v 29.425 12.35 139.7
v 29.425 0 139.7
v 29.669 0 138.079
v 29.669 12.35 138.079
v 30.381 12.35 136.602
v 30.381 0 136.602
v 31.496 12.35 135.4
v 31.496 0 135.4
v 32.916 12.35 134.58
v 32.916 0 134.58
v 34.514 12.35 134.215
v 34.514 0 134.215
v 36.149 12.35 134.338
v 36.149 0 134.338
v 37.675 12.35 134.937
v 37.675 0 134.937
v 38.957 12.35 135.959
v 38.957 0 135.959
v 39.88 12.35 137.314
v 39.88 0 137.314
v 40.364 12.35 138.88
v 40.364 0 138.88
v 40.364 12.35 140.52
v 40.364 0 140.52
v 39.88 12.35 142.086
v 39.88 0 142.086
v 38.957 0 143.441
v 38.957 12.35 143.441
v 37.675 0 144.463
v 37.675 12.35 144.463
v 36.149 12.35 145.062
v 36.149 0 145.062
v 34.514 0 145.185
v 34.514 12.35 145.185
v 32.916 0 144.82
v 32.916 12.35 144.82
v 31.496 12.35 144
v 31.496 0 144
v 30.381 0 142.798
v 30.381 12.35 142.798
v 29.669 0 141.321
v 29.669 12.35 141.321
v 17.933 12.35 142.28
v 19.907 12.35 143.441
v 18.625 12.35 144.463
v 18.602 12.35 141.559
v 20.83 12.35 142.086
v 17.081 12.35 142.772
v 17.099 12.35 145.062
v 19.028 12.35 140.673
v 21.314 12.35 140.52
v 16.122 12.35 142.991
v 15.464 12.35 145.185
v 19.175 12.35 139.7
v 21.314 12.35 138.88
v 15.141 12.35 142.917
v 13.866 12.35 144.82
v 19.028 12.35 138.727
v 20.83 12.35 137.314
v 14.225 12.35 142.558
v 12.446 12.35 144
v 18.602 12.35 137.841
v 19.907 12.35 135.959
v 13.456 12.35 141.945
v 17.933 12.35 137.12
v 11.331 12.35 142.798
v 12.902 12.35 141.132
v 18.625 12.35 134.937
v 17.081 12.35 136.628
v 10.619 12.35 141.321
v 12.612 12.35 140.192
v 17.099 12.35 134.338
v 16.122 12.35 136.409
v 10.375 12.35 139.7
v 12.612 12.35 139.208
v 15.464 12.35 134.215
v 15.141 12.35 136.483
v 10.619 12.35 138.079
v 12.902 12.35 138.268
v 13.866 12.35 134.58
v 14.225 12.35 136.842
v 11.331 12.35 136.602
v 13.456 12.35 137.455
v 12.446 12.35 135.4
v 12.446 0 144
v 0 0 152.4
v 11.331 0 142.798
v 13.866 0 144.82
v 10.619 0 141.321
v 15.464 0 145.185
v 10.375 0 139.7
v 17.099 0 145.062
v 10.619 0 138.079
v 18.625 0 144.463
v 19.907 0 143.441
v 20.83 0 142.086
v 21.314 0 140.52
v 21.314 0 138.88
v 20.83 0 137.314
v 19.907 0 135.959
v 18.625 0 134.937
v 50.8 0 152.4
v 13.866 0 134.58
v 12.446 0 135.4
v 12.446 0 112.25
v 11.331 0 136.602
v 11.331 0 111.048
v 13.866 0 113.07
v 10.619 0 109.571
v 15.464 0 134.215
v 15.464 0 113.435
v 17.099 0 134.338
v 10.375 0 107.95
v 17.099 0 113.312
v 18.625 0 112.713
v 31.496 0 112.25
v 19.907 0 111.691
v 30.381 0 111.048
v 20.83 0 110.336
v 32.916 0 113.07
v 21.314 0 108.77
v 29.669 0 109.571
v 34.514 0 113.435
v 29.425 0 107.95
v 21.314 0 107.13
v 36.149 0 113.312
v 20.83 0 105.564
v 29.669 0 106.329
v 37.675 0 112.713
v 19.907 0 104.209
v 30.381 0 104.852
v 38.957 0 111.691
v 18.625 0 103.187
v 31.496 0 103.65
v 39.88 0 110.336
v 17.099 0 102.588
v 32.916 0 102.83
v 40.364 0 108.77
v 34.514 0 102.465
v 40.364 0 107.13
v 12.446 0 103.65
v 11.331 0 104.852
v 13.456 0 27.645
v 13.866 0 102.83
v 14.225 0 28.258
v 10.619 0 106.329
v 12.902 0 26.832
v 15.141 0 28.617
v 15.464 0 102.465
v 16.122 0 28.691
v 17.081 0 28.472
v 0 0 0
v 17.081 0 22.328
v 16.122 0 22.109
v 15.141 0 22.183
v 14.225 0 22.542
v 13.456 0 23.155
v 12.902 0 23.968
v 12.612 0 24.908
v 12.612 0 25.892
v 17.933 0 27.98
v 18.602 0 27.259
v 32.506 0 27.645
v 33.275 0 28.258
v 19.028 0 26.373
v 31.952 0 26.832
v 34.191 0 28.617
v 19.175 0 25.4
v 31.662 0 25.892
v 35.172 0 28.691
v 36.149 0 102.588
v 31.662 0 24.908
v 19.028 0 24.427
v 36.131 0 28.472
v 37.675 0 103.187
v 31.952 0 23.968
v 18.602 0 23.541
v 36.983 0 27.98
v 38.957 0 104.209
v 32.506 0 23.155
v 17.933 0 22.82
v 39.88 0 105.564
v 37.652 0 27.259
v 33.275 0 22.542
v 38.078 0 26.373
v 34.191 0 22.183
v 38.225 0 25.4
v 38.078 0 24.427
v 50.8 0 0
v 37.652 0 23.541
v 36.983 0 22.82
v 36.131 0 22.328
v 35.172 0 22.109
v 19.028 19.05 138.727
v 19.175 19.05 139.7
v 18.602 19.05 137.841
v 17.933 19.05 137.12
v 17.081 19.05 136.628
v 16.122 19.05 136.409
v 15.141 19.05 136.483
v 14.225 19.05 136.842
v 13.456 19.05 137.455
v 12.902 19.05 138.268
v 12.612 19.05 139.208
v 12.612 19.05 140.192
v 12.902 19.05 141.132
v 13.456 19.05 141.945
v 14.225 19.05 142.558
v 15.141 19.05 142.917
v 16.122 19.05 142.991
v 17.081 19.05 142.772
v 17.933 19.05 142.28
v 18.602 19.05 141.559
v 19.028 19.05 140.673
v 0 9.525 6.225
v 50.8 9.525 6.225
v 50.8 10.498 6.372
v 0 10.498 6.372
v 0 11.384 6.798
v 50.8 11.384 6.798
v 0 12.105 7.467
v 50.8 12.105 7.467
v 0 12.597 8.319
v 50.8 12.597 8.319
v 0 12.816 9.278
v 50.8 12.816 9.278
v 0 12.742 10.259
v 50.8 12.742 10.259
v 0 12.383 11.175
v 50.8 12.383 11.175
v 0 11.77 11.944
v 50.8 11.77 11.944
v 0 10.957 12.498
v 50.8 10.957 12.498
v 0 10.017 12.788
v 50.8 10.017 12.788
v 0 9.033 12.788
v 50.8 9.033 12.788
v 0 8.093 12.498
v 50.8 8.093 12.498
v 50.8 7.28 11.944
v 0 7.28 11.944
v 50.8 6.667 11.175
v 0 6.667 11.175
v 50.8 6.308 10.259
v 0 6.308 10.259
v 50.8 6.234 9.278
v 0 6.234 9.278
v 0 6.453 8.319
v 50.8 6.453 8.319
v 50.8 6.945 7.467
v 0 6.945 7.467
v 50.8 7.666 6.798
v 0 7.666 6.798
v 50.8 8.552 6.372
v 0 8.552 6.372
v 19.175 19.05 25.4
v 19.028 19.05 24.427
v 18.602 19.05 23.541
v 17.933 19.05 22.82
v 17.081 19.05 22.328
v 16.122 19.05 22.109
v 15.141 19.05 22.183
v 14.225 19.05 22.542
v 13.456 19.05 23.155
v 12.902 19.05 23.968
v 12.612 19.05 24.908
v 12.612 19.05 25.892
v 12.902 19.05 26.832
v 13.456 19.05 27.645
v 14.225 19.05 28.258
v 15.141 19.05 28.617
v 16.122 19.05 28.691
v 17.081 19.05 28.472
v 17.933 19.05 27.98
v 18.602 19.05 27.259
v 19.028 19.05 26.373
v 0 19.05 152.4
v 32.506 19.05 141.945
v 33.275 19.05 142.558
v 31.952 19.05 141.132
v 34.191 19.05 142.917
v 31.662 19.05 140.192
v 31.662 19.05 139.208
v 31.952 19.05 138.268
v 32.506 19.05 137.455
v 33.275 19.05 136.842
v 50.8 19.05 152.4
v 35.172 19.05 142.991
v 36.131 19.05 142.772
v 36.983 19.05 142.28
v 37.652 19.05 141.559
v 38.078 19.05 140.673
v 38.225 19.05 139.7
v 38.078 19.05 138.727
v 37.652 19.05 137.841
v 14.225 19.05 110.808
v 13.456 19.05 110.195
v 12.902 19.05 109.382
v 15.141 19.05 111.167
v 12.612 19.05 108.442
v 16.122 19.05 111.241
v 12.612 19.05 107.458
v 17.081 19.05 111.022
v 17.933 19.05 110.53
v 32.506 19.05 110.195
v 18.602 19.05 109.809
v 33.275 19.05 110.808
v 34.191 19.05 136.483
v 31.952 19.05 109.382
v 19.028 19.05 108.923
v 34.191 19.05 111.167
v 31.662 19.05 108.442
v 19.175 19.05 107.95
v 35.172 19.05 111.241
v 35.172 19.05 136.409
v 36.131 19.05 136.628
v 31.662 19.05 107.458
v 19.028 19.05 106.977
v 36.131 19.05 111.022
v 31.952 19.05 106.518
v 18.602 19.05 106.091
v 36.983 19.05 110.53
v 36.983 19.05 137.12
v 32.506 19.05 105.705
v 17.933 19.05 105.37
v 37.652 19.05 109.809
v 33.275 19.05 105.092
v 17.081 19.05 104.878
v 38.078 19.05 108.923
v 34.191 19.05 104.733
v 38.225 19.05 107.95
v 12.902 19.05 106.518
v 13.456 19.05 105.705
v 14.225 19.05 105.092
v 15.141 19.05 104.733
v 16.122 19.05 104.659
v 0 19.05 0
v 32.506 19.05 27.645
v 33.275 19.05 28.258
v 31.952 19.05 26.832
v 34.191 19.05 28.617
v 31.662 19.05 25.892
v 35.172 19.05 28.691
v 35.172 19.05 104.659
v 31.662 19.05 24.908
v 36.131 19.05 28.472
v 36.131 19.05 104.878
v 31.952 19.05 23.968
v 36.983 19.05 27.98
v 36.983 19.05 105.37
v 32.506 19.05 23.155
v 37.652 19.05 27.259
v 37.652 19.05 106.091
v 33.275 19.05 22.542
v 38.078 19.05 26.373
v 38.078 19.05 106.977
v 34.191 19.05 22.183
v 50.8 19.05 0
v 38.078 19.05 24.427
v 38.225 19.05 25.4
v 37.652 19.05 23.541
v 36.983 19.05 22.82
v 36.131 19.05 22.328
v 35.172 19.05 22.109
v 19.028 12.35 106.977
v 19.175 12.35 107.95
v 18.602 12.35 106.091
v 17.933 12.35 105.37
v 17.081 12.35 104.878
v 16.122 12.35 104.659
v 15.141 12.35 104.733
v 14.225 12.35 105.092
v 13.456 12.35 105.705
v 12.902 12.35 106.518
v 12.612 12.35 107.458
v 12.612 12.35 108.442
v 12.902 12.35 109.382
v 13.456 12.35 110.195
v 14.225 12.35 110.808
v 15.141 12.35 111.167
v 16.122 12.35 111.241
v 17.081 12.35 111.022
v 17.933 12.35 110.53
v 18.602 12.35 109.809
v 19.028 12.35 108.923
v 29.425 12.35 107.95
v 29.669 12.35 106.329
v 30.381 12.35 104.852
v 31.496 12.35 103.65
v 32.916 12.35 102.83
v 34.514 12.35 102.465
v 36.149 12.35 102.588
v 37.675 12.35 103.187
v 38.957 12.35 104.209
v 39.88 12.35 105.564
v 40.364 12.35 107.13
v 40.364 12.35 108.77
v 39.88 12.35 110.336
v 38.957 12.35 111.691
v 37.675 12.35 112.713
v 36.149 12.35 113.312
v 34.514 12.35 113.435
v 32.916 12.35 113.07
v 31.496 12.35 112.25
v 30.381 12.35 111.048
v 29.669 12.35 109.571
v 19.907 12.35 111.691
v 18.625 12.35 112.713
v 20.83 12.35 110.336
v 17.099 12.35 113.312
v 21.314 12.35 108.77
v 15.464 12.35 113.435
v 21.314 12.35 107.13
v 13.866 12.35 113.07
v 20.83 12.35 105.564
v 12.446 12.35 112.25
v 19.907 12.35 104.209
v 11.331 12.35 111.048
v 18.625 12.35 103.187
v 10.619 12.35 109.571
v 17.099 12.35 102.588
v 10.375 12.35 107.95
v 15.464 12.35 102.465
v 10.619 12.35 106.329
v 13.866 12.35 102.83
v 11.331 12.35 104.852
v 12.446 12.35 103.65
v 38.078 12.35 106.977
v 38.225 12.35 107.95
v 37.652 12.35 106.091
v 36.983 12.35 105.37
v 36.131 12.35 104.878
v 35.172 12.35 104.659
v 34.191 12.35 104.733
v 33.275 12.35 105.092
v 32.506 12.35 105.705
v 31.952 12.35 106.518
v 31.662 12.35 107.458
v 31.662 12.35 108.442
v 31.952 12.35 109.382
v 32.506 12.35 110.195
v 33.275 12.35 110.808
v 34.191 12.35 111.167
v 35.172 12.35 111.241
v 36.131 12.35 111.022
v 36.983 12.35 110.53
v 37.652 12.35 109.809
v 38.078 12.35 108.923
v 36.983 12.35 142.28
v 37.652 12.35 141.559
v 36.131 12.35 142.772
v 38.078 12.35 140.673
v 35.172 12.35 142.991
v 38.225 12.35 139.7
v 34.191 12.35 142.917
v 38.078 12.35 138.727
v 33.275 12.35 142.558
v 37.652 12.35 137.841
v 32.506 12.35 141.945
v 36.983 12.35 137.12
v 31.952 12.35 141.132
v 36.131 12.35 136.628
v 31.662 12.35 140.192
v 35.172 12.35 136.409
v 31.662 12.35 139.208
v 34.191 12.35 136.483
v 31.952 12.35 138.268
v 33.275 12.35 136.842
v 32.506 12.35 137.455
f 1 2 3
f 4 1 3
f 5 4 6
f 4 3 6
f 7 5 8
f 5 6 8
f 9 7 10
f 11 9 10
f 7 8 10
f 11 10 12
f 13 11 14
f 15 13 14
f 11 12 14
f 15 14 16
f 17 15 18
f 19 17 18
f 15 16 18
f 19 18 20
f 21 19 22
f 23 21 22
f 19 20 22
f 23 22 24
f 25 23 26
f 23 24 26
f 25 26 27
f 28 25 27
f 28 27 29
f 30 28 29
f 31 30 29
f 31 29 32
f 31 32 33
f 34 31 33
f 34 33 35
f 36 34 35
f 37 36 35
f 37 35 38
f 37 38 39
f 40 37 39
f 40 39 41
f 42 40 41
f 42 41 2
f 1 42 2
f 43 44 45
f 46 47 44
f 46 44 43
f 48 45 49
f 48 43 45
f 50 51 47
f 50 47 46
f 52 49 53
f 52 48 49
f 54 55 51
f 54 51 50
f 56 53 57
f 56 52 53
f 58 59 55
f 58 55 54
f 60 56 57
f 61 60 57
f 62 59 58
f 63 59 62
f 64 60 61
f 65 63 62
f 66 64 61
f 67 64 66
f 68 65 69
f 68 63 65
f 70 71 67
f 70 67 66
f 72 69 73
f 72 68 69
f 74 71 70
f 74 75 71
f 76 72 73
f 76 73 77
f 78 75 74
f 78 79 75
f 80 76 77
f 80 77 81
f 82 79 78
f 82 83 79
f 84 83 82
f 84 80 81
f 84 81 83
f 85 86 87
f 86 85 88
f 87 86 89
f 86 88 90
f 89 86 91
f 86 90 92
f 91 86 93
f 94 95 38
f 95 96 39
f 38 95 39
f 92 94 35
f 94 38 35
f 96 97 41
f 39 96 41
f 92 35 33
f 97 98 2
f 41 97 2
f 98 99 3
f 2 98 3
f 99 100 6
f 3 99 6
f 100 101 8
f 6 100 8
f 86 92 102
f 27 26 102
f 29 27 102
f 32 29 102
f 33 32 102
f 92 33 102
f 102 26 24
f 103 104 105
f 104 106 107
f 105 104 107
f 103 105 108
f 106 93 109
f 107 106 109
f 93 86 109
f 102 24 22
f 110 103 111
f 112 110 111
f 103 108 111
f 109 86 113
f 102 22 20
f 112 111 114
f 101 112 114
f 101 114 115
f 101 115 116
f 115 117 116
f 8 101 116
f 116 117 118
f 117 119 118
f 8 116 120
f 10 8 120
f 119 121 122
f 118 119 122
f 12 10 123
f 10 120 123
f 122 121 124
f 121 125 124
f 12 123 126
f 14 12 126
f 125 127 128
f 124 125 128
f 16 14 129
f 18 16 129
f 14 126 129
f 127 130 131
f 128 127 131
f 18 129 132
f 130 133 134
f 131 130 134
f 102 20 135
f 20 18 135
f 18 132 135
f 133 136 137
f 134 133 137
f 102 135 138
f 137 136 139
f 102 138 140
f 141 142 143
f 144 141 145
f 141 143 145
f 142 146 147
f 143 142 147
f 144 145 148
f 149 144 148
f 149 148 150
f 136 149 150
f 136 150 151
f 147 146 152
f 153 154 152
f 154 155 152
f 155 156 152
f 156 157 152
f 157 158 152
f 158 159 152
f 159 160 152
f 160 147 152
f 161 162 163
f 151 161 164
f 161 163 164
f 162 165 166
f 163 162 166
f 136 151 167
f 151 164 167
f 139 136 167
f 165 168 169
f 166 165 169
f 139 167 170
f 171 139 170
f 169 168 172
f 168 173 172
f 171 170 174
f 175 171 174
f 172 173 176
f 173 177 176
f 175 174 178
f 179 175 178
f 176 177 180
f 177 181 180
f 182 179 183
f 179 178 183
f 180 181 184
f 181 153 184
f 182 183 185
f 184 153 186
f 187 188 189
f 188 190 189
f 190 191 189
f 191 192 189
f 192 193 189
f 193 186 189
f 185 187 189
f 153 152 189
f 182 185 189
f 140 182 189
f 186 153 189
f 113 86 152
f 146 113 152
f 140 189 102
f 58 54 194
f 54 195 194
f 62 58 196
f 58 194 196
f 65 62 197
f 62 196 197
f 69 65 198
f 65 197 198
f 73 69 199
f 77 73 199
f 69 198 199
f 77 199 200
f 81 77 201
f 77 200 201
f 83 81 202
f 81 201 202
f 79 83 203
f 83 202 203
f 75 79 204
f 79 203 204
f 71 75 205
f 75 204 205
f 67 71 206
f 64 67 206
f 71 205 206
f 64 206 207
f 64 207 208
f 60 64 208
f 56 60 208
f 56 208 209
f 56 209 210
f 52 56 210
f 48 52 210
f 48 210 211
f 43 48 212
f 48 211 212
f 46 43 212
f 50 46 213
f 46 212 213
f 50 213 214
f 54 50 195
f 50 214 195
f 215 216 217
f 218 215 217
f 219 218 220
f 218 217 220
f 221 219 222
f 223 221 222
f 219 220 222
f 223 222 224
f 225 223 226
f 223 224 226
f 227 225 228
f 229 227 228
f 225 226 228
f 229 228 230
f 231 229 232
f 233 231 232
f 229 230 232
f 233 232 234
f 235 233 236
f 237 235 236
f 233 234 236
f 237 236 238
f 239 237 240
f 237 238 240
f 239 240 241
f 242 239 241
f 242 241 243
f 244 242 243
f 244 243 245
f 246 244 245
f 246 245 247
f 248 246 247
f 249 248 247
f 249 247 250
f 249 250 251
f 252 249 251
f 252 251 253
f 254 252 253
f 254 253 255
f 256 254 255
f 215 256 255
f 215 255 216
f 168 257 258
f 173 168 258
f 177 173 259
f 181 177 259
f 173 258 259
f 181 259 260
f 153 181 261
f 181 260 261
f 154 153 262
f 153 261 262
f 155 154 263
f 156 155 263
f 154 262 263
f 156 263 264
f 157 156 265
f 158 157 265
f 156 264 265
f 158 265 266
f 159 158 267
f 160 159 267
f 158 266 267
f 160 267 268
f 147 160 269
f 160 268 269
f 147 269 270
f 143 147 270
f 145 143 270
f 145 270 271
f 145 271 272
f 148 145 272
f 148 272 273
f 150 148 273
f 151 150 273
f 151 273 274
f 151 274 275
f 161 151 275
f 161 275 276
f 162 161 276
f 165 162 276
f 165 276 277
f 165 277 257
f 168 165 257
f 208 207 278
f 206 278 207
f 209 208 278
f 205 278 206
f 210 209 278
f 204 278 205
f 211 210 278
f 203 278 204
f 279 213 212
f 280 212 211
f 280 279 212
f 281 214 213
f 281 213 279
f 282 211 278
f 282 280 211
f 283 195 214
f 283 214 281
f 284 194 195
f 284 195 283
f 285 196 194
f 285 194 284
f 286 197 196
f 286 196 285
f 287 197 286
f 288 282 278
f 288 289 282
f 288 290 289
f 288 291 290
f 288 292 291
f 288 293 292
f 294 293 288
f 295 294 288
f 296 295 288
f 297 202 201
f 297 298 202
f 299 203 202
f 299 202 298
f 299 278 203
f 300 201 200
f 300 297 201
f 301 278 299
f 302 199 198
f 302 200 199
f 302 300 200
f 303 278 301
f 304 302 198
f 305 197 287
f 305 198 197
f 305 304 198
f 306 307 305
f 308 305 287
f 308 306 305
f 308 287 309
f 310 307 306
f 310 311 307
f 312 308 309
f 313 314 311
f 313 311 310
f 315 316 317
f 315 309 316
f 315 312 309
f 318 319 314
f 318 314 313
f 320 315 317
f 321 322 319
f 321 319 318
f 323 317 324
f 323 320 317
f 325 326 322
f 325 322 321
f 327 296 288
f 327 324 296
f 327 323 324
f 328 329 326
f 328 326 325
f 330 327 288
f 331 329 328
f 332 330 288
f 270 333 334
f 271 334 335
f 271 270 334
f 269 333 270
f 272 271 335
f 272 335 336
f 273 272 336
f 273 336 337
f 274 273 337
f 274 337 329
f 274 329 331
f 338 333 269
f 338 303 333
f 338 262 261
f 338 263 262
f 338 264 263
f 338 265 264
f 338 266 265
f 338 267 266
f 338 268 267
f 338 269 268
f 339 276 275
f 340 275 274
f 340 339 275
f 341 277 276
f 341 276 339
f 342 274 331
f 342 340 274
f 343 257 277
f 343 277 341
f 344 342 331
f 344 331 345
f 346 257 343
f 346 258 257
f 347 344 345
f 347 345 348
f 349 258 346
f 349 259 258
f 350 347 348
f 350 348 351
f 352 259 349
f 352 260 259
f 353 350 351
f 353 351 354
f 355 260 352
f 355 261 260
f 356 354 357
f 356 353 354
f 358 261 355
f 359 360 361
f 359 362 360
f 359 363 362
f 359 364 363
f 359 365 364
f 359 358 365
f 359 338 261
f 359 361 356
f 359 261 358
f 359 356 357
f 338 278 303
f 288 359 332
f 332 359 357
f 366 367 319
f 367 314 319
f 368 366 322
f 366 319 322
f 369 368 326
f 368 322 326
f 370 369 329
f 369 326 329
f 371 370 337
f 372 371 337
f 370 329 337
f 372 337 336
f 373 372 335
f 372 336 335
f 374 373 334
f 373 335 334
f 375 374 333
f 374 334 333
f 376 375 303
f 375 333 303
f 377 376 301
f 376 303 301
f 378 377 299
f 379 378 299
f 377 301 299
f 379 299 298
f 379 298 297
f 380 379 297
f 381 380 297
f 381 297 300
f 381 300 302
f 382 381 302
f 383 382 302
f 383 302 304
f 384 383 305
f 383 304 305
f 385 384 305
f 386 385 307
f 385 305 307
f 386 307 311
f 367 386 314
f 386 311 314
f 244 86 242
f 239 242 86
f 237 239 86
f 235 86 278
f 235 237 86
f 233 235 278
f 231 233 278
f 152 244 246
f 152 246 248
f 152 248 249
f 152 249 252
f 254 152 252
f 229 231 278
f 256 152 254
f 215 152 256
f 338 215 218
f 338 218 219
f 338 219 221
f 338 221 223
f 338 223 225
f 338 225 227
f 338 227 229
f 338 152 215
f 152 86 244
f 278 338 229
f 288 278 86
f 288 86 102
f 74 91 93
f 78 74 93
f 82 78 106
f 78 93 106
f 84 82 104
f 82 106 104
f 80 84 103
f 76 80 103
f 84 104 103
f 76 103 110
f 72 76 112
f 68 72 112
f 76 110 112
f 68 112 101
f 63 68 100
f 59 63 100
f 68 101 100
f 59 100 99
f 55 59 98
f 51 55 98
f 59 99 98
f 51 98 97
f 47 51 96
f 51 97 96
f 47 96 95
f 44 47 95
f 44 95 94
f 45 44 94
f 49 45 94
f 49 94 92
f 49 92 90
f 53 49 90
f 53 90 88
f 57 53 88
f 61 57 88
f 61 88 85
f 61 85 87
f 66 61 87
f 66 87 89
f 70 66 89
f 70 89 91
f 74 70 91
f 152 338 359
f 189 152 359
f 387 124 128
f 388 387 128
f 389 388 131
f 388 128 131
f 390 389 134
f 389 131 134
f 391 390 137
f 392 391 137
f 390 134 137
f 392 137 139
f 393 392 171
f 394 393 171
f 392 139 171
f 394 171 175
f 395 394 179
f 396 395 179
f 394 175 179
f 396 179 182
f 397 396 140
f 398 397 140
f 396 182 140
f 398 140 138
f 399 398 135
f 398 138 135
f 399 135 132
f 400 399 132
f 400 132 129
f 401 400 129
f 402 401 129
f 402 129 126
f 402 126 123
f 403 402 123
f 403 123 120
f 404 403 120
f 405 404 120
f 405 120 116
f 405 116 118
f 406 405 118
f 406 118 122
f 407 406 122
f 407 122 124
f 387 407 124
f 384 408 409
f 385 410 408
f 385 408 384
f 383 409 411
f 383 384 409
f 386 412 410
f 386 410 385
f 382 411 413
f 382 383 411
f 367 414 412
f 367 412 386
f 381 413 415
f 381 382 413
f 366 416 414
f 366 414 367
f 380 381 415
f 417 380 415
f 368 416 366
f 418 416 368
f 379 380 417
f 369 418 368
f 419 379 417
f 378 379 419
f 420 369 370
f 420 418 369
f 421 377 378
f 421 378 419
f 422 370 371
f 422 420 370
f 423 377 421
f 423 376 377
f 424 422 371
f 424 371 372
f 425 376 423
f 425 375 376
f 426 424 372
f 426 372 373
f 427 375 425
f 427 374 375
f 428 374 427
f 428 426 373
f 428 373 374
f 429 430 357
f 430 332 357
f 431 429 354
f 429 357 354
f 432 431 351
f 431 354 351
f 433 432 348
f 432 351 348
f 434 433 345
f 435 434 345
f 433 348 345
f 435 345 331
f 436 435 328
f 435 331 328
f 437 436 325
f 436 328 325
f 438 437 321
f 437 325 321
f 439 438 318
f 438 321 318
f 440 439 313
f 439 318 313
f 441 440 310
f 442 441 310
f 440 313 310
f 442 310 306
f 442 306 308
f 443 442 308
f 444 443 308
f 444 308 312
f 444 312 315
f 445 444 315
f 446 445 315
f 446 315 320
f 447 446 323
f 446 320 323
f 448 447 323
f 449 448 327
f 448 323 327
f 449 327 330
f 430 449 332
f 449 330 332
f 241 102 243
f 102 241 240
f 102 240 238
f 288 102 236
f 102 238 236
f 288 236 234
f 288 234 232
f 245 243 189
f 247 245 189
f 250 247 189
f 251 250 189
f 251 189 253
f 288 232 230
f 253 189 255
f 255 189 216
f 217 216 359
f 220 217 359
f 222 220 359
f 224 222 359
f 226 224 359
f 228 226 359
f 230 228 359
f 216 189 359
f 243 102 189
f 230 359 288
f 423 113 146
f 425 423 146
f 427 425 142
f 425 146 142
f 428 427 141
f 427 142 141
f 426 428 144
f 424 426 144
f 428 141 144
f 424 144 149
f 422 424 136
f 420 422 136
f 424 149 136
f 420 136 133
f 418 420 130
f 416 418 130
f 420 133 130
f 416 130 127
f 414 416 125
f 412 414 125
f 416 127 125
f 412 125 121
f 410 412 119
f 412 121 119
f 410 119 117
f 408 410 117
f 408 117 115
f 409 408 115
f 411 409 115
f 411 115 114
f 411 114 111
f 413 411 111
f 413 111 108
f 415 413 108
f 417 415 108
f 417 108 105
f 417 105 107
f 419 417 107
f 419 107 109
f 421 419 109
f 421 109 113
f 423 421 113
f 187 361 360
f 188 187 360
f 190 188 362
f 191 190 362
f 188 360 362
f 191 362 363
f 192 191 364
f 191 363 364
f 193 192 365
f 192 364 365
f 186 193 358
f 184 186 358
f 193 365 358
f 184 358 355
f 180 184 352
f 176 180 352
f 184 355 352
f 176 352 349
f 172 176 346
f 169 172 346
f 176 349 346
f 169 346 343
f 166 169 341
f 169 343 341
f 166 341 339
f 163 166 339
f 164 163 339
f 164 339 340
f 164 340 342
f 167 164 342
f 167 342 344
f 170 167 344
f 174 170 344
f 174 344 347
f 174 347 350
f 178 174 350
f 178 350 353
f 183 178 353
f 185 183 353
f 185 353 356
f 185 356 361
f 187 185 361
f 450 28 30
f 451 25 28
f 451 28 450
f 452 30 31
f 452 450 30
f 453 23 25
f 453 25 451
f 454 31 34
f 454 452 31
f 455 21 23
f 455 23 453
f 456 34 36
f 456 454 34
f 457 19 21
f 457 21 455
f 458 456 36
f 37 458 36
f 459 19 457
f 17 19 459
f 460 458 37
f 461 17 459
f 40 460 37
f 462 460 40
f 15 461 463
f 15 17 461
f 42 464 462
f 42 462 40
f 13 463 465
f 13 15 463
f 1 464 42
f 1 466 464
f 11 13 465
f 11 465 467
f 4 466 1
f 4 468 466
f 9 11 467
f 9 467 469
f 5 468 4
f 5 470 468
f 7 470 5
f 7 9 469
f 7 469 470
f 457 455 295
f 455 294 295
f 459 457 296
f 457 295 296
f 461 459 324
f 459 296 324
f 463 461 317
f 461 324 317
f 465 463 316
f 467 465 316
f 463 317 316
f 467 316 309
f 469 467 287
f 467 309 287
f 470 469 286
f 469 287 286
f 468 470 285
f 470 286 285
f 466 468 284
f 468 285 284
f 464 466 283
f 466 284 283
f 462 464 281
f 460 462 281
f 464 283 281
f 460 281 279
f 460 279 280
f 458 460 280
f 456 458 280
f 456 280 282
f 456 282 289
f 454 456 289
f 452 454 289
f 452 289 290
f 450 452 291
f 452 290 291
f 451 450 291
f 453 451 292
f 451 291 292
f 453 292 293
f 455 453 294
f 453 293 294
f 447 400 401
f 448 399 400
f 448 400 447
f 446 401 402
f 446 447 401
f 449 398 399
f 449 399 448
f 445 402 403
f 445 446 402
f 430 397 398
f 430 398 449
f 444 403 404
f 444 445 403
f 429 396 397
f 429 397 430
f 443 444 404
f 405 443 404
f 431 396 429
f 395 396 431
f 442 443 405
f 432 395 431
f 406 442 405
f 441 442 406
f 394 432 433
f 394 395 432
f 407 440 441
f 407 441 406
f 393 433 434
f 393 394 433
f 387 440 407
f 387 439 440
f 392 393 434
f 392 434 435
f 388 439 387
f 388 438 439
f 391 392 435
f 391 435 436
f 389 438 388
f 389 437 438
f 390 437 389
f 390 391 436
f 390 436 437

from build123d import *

# Parameters (mm, degrees)
SKETCH1_W                      = 50.8
SKETCH1_H                      = 19.05
BOSS_EXTRUDE1_DEPTH            = 152.4
CBORE_FOR_M6_SHCS1_D           = 6.6
CBORE_FOR_M6_SHCS1_CBORE_D     = 11
CBORE_FOR_M6_SHCS1_CBORE_DEPTH = 12.35
M6_CLEARANCE_HOLE1_D           = 6.6
M6_CLEARANCE_HOLE2_D           = 6.6


with BuildPart() as part:
    # Sketch1 → Boss-Extrude1 (new body)
    with BuildSketch(Plane.XY):
        with Locations((25.4, 9.525)):
            Rectangle(SKETCH1_W, SKETCH1_H)
    extrude(amount=BOSS_EXTRUDE1_DEPTH)

    # CBORE for M6 SHCS1 (through all)
    with Locations(Plane(origin=(0, 0, 0), x_dir=(-1, 0, 0), z_dir=(0, -1, 0))):
        with Locations((-34.925, -139.7), (-34.925, -107.95), (-15.875, -107.95), (-15.875, -139.7)):
            CounterBoreHole(CBORE_FOR_M6_SHCS1_D / 2, CBORE_FOR_M6_SHCS1_CBORE_D / 2, CBORE_FOR_M6_SHCS1_CBORE_DEPTH)

    # M6 Clearance Hole1 (through all)
    with Locations(Plane.ZY):
        with Locations((9.525, 9.525)):
            Hole(M6_CLEARANCE_HOLE1_D / 2)

    # M6 Clearance Hole2 (through all)
    with Locations(Plane(origin=(0, 0, 0), x_dir=(-1, 0, 0), z_dir=(0, -1, 0))):
        with Locations((-34.925, -25.4), (-15.875, -25.4)):
            Hole(M6_CLEARANCE_HOLE2_D / 2)


solid = part.part
